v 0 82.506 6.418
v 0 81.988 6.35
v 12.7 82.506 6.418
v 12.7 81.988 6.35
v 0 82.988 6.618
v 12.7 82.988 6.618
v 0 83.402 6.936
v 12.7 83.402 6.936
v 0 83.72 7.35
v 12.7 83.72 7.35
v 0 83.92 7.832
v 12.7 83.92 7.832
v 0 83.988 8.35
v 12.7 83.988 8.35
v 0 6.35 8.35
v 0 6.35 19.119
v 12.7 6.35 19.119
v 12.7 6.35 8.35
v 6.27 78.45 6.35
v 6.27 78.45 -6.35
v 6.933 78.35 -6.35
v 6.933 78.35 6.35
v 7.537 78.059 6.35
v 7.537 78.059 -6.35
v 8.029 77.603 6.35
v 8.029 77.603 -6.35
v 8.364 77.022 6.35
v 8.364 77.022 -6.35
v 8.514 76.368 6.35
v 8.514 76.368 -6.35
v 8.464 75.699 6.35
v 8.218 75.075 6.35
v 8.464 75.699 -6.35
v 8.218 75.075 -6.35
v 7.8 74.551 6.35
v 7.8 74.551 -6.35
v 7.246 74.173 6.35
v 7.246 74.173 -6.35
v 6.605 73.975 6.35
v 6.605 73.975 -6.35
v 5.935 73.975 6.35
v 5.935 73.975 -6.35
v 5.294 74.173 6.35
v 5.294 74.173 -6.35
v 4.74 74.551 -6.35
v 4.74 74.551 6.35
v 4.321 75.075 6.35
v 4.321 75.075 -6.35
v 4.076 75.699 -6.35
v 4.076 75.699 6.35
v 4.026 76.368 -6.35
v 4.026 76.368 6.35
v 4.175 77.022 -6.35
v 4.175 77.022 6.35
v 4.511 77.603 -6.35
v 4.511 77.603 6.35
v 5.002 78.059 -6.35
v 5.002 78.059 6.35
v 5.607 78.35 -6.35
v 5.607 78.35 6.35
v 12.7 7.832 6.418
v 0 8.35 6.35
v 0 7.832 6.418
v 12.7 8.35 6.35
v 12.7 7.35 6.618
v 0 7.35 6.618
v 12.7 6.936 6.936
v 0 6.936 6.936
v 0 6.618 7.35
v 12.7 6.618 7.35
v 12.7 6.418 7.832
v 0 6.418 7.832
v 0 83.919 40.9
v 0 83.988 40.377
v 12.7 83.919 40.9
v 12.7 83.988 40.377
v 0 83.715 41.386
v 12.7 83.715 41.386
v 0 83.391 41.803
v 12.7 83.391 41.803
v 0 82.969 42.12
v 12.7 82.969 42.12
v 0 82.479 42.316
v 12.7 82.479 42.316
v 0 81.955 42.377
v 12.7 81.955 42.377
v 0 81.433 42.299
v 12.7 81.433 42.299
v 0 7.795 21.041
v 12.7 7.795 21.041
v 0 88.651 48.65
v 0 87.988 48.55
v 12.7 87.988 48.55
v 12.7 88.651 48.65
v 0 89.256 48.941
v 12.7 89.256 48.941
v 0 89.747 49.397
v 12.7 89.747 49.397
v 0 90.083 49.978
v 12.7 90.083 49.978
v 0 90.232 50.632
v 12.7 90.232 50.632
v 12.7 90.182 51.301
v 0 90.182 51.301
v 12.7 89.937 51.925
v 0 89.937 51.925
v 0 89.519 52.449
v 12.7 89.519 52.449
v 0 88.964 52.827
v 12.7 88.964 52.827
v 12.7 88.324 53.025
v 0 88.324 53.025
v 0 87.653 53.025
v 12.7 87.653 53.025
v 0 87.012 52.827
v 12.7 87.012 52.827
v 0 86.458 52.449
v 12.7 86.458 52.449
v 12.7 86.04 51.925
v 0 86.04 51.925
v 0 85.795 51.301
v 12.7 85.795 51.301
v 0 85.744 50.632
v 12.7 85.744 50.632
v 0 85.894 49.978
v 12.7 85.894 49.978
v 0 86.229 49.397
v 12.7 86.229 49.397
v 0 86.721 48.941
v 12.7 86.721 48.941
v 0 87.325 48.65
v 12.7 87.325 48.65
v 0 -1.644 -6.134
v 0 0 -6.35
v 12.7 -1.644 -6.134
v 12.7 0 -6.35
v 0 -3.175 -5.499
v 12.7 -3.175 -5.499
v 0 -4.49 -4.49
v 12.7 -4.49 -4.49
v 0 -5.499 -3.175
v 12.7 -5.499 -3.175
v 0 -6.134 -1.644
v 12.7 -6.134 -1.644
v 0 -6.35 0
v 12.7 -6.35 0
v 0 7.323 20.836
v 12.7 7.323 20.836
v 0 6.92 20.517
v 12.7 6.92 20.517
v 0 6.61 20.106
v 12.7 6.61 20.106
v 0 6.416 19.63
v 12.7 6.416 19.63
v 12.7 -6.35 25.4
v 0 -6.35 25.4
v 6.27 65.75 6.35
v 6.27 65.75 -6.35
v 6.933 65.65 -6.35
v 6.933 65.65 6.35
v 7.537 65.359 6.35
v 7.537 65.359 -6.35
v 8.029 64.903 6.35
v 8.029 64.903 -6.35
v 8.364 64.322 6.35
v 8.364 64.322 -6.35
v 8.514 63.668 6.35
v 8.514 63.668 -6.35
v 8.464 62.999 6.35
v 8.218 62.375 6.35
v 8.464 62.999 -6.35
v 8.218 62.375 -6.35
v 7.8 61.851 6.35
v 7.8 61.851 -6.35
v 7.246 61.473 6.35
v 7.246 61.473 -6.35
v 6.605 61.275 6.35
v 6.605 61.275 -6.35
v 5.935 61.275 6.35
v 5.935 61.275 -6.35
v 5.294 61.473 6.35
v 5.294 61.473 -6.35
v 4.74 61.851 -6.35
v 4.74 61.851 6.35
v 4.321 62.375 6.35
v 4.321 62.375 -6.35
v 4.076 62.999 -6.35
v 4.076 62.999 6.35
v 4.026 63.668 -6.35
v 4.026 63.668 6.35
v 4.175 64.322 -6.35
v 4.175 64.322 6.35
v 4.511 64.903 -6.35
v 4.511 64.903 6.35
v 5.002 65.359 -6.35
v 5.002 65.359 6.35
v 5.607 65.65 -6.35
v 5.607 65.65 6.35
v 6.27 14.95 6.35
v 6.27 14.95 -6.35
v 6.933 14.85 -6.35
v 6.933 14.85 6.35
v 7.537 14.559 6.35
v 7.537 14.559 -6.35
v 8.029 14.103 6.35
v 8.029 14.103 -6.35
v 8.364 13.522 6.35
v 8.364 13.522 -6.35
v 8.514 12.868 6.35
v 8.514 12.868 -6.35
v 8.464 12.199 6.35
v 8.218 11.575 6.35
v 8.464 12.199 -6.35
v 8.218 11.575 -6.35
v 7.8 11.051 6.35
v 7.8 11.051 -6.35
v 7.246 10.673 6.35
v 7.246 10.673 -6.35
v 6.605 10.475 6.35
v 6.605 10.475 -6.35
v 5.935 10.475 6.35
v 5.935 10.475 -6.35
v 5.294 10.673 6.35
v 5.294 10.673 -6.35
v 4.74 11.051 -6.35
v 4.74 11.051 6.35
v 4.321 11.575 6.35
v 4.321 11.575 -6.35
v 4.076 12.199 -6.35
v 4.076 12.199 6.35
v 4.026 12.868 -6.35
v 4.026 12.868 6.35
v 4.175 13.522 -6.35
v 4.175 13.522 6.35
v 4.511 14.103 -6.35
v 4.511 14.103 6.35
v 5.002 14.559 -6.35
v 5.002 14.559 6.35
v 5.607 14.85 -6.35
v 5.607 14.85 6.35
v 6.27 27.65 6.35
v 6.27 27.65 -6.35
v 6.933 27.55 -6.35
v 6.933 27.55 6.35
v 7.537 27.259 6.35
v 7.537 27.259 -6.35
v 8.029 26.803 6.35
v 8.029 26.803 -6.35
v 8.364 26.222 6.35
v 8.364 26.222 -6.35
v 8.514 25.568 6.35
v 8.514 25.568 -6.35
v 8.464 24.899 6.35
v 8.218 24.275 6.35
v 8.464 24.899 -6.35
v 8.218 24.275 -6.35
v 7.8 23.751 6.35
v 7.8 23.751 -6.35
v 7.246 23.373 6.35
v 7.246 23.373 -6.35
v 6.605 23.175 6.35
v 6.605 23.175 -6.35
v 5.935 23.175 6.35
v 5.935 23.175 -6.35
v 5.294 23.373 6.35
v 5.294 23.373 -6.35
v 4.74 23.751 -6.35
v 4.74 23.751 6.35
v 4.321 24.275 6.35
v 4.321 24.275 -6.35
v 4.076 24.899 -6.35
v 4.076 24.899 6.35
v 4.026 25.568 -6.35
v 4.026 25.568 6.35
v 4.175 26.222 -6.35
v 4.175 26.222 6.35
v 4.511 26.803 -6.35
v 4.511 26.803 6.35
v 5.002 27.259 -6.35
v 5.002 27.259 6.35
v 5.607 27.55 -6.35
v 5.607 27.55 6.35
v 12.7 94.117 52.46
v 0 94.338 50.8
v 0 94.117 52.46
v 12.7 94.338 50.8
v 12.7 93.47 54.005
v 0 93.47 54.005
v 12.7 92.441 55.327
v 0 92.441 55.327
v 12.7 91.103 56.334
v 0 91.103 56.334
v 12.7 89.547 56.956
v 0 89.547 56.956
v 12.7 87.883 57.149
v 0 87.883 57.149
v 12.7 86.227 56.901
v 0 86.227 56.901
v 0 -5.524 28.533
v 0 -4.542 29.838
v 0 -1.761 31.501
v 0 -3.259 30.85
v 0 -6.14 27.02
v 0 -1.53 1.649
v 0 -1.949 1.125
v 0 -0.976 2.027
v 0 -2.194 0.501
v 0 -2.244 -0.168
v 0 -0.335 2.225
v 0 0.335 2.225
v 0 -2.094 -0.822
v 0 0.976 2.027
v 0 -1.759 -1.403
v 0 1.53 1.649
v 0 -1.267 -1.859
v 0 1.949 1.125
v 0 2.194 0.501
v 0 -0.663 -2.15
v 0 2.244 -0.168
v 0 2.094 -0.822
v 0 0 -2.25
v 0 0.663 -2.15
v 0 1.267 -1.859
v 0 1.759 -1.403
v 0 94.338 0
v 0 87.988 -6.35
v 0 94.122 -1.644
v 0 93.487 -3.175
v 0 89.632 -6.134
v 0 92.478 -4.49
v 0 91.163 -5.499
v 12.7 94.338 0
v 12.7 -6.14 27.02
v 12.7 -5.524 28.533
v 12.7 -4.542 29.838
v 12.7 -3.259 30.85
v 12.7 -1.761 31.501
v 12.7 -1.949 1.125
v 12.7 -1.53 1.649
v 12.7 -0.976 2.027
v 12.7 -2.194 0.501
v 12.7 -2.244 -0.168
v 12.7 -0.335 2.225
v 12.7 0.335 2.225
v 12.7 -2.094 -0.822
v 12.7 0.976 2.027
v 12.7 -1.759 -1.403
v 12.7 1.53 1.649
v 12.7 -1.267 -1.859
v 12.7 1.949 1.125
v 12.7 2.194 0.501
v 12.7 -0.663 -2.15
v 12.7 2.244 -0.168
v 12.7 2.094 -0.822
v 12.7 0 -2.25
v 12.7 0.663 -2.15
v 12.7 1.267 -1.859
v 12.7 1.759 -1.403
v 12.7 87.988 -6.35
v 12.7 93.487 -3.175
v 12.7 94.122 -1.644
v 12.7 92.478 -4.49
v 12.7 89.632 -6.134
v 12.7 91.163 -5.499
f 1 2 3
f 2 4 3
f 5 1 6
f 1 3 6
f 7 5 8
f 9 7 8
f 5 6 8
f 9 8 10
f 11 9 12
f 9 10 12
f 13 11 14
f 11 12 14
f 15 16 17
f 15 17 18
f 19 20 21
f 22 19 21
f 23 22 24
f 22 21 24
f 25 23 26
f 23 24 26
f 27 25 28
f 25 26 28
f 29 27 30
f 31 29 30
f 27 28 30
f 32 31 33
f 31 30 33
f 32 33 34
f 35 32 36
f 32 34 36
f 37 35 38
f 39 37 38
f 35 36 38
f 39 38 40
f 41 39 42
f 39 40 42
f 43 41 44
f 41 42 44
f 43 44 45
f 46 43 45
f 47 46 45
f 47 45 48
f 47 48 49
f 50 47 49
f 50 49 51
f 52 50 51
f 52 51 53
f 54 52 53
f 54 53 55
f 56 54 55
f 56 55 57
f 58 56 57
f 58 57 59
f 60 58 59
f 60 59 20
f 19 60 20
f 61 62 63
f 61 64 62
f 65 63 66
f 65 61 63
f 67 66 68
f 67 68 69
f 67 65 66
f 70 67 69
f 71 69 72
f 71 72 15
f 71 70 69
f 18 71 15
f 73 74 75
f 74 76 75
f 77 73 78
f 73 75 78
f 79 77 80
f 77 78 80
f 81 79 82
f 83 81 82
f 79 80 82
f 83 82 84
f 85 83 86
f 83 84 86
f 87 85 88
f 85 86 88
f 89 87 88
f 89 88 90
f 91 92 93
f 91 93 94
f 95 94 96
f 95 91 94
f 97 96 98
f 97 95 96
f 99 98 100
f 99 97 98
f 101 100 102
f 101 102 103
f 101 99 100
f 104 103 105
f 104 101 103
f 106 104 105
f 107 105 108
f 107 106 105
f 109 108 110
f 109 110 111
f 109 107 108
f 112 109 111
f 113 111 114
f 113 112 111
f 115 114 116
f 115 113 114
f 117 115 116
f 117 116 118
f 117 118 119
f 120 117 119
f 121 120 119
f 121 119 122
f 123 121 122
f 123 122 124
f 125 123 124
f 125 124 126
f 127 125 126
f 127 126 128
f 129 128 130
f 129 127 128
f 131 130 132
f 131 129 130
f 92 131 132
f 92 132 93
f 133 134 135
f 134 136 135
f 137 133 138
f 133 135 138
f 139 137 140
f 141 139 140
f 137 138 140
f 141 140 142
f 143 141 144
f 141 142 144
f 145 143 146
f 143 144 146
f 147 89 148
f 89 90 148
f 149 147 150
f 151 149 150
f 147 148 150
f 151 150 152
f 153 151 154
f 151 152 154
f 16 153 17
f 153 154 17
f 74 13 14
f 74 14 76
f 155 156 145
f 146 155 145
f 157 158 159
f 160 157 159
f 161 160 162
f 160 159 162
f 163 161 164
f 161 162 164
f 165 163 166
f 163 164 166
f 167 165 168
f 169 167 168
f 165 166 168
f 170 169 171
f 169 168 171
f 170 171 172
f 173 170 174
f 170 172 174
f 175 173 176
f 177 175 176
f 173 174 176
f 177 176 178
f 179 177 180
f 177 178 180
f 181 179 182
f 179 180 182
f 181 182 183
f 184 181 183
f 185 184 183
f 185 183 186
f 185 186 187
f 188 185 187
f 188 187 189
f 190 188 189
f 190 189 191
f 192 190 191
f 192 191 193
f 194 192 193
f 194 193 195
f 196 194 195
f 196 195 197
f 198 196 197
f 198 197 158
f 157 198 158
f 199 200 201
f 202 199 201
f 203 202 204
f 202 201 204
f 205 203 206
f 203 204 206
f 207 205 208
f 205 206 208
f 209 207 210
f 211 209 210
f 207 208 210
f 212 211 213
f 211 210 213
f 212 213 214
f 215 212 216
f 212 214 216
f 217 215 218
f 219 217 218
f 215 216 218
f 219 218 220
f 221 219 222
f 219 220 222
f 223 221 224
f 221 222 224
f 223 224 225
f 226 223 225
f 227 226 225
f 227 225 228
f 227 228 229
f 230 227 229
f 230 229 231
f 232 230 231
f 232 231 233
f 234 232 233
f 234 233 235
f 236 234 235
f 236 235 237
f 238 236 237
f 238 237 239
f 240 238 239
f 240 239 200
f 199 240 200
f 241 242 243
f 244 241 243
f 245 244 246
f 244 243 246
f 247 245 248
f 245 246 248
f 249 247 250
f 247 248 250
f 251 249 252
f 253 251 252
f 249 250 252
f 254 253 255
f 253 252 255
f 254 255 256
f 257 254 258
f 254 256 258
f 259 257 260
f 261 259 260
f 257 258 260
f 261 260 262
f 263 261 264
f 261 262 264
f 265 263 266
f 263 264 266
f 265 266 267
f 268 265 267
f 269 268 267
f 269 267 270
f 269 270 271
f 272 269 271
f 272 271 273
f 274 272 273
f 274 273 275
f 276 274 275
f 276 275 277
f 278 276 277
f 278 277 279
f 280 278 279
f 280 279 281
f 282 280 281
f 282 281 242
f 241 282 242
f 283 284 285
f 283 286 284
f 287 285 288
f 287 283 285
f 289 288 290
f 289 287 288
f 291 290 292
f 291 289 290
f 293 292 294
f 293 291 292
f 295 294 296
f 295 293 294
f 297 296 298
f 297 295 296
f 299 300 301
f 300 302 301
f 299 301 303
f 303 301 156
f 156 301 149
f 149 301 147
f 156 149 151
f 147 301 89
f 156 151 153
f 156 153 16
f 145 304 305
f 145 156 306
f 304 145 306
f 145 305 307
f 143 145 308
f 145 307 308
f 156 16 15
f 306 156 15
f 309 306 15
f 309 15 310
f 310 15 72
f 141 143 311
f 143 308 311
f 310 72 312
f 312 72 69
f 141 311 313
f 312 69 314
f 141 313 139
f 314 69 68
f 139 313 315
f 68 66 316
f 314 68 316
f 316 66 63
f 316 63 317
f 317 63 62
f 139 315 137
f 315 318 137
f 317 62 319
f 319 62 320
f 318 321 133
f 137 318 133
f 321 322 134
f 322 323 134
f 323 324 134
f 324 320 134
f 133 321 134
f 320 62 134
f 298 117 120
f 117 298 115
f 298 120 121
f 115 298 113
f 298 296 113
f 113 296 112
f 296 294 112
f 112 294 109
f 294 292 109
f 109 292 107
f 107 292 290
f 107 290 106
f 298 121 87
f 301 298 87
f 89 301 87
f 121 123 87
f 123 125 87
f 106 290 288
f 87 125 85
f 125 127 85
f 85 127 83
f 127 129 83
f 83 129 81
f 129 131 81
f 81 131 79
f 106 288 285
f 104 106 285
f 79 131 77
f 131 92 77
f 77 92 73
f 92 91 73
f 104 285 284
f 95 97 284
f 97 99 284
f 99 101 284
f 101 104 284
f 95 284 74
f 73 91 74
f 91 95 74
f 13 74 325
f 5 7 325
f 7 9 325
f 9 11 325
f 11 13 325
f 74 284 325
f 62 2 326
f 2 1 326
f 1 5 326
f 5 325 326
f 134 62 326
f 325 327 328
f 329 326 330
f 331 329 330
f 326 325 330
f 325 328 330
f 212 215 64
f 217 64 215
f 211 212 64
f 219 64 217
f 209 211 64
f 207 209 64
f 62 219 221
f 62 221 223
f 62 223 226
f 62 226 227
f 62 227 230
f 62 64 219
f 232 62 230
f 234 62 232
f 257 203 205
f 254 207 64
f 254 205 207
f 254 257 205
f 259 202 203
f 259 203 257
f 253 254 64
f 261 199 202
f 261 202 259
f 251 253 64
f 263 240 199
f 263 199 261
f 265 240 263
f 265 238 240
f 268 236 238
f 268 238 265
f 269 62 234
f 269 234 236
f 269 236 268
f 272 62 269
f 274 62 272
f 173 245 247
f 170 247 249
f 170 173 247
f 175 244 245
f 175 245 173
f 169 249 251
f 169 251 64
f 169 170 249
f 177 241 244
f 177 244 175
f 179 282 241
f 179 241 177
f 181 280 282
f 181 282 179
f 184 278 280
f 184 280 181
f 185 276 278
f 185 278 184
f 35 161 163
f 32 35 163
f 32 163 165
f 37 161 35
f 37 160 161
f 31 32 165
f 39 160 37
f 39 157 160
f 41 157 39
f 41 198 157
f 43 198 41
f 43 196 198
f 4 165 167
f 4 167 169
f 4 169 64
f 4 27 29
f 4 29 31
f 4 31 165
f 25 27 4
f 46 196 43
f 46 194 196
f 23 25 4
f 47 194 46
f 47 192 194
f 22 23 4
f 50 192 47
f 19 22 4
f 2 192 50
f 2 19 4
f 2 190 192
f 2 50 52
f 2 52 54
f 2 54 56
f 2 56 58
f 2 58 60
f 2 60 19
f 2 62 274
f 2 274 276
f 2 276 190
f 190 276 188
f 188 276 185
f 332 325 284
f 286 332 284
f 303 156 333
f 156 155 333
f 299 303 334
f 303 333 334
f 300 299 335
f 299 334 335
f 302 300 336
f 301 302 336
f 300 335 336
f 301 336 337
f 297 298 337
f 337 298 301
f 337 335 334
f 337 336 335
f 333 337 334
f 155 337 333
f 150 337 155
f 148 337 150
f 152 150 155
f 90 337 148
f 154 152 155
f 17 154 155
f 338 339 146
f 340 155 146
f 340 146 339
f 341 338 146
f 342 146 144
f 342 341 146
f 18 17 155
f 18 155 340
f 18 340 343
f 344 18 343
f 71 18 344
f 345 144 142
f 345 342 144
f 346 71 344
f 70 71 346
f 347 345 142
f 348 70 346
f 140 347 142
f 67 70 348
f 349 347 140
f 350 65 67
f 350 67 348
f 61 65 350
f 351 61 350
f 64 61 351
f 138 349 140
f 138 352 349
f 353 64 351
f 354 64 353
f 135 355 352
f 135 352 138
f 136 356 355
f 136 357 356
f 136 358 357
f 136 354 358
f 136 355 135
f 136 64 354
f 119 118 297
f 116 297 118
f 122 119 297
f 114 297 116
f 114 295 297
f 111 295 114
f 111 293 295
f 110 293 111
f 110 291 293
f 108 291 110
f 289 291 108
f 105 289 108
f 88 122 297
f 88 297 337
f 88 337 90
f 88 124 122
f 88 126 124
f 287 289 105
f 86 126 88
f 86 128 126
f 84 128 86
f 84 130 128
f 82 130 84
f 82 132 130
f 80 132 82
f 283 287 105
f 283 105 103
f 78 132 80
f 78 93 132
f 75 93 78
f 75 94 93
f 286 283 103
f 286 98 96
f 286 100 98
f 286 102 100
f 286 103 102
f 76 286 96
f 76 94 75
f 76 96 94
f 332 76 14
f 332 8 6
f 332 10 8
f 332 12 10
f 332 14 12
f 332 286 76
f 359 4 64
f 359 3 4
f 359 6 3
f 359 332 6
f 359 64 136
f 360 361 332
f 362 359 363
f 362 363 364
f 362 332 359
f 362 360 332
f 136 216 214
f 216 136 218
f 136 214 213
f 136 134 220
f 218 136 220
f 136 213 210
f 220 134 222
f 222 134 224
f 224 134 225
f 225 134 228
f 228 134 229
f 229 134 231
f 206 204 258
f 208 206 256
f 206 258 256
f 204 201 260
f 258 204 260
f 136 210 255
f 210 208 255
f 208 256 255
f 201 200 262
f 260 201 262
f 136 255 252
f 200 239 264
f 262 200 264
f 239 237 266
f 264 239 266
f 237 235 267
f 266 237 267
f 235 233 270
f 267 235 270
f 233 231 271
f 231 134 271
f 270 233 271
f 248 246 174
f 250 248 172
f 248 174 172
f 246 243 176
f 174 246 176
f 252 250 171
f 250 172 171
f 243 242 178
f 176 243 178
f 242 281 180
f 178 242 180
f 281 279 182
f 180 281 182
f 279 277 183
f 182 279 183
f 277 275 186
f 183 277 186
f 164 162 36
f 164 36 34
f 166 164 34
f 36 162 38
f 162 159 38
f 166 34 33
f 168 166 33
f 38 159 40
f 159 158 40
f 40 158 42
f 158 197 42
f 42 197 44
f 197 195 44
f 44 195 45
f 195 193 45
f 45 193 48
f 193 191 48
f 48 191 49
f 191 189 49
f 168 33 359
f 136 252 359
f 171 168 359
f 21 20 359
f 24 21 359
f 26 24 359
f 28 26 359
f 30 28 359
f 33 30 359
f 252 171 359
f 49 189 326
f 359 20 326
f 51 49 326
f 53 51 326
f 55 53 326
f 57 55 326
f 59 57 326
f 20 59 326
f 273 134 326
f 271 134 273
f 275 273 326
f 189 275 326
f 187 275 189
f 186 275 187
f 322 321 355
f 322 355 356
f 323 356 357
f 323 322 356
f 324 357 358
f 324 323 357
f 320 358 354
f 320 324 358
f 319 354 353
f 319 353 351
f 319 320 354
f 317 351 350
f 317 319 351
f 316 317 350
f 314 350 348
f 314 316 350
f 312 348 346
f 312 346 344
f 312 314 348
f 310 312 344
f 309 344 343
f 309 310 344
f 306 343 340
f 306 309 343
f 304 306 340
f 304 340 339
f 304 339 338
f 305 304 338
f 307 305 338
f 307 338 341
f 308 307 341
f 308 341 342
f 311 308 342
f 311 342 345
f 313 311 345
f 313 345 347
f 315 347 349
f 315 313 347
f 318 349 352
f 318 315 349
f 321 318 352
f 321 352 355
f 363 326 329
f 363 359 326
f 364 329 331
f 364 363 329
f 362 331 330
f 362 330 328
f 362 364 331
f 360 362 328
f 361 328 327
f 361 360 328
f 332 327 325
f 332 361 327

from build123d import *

# Parameters (mm, degrees)
SKETCH1_R           = 2.25
BOSS_EXTRUDE1_DEPTH = 12.7
CUT_EXTRUDE1_REACH  = 117.6
SKETCH3_R           = 2.25
FILLET3_R           = 6.35
FILLET4_R           = 2


with BuildPart() as part:
    # Sketch1 → Boss-Extrude1 (new body)
    with BuildSketch(Plane(origin=(0, 0, 0), x_dir=(0, 0, -1), z_dir=(1, 0, 0))):
        Polygon((6.35, -6.35), (6.35, 94.338181024), (-59.242376653, 94.338181024), (-30.176202444, -6.35), align=None)
        Circle(SKETCH1_R, mode=Mode.SUBTRACT)
        with Locations((-50.8, 87.988181024)):
            Circle(SKETCH1_R, mode=Mode.SUBTRACT)
        Polygon((-6.35, 6.35), (-6.35, 83.988181024), (-43.036009913, 83.988181024), (-20.623797556, 6.35), align=None, mode=Mode.SUBTRACT)
    extrude(amount=BOSS_EXTRUDE1_DEPTH)

    # Sketch3 → Cut-Extrude1 (cut, up to next)
    with BuildSketch(Plane(origin=(0, 0, -6.35), x_dir=(-1, 0, 0), z_dir=(0, 0, -1)), mode=Mode.PRIVATE) as cut_extrude1_sk1:
        with Locations(Location((-6.269939037, 76.2, 0), (0, 0, 90))):
            Circle(SKETCH3_R)
    cut_extrude1_tool1 = extrude(cut_extrude1_sk1.sketch, amount=-CUT_EXTRUDE1_REACH, mode=Mode.PRIVATE) & part.part
    # Sketch3 → Cut-Extrude1 (cut, up to next)
    with BuildSketch(Plane(origin=(0, 0, -6.35), x_dir=(-1, 0, 0), z_dir=(0, 0, -1)), mode=Mode.PRIVATE) as cut_extrude1_sk2:
        with Locations(Location((-6.269939037, 63.5, 0), (0, 0, 90))):
            Circle(SKETCH3_R)
    cut_extrude1_tool2 = extrude(cut_extrude1_sk2.sketch, amount=-CUT_EXTRUDE1_REACH, mode=Mode.PRIVATE) & part.part
    # Sketch3 → Cut-Extrude1 (cut, up to next)
    with BuildSketch(Plane(origin=(0, 0, -6.35), x_dir=(-1, 0, 0), z_dir=(0, 0, -1)), mode=Mode.PRIVATE) as cut_extrude1_sk3:
        with Locations(Location((-6.269939037, 12.7, 0), (0, 0, 90))):
            Circle(SKETCH3_R)
    cut_extrude1_tool3 = extrude(cut_extrude1_sk3.sketch, amount=-CUT_EXTRUDE1_REACH, mode=Mode.PRIVATE) & part.part
    # Sketch3 → Cut-Extrude1 (cut, up to next)
    with BuildSketch(Plane(origin=(0, 0, -6.35), x_dir=(-1, 0, 0), z_dir=(0, 0, -1)), mode=Mode.PRIVATE) as cut_extrude1_sk4:
        with Locations(Location((-6.269939037, 25.4, 0), (0, 0, 90))):
            Circle(SKETCH3_R)
    cut_extrude1_tool4 = extrude(cut_extrude1_sk4.sketch, amount=-CUT_EXTRUDE1_REACH, mode=Mode.PRIVATE) & part.part
    add(cut_extrude1_tool1.solids().sort_by_distance((6.269939, 76.2, -6.35))[0], mode=Mode.SUBTRACT)
    add(cut_extrude1_tool2.solids().sort_by_distance((6.269939, 63.5, -6.35))[0], mode=Mode.SUBTRACT)
    add(cut_extrude1_tool3.solids().sort_by_distance((6.269939, 12.7, -6.35))[0], mode=Mode.SUBTRACT)
    add(cut_extrude1_tool4.solids().sort_by_distance((6.269939, 25.4, -6.35))[0], mode=Mode.SUBTRACT)

    # Fillet3
    fillet3_edges = [part.edges().sort_by_distance(p)[0] for p in [
        (6.35, 94.338181024, 59.242376653),
        (6.35, 94.338181024, -6.35),
        (6.35, -6.35, -6.35),
        (6.35, -6.35, 30.176202444),
    ]]
    fillet(fillet3_edges, radius=FILLET3_R)

    # Fillet4
    fillet4_edges = [part.edges().sort_by_distance(p)[0] for p in [
        (6.35, 83.988181024, 43.036009913),
        (6.35, 6.35, 20.623797556),
        (6.35, 6.35, 6.35),
        (6.35, 83.988181024, 6.35),
    ]]
    fillet(fillet4_edges, radius=FILLET4_R)


solid = part.part
